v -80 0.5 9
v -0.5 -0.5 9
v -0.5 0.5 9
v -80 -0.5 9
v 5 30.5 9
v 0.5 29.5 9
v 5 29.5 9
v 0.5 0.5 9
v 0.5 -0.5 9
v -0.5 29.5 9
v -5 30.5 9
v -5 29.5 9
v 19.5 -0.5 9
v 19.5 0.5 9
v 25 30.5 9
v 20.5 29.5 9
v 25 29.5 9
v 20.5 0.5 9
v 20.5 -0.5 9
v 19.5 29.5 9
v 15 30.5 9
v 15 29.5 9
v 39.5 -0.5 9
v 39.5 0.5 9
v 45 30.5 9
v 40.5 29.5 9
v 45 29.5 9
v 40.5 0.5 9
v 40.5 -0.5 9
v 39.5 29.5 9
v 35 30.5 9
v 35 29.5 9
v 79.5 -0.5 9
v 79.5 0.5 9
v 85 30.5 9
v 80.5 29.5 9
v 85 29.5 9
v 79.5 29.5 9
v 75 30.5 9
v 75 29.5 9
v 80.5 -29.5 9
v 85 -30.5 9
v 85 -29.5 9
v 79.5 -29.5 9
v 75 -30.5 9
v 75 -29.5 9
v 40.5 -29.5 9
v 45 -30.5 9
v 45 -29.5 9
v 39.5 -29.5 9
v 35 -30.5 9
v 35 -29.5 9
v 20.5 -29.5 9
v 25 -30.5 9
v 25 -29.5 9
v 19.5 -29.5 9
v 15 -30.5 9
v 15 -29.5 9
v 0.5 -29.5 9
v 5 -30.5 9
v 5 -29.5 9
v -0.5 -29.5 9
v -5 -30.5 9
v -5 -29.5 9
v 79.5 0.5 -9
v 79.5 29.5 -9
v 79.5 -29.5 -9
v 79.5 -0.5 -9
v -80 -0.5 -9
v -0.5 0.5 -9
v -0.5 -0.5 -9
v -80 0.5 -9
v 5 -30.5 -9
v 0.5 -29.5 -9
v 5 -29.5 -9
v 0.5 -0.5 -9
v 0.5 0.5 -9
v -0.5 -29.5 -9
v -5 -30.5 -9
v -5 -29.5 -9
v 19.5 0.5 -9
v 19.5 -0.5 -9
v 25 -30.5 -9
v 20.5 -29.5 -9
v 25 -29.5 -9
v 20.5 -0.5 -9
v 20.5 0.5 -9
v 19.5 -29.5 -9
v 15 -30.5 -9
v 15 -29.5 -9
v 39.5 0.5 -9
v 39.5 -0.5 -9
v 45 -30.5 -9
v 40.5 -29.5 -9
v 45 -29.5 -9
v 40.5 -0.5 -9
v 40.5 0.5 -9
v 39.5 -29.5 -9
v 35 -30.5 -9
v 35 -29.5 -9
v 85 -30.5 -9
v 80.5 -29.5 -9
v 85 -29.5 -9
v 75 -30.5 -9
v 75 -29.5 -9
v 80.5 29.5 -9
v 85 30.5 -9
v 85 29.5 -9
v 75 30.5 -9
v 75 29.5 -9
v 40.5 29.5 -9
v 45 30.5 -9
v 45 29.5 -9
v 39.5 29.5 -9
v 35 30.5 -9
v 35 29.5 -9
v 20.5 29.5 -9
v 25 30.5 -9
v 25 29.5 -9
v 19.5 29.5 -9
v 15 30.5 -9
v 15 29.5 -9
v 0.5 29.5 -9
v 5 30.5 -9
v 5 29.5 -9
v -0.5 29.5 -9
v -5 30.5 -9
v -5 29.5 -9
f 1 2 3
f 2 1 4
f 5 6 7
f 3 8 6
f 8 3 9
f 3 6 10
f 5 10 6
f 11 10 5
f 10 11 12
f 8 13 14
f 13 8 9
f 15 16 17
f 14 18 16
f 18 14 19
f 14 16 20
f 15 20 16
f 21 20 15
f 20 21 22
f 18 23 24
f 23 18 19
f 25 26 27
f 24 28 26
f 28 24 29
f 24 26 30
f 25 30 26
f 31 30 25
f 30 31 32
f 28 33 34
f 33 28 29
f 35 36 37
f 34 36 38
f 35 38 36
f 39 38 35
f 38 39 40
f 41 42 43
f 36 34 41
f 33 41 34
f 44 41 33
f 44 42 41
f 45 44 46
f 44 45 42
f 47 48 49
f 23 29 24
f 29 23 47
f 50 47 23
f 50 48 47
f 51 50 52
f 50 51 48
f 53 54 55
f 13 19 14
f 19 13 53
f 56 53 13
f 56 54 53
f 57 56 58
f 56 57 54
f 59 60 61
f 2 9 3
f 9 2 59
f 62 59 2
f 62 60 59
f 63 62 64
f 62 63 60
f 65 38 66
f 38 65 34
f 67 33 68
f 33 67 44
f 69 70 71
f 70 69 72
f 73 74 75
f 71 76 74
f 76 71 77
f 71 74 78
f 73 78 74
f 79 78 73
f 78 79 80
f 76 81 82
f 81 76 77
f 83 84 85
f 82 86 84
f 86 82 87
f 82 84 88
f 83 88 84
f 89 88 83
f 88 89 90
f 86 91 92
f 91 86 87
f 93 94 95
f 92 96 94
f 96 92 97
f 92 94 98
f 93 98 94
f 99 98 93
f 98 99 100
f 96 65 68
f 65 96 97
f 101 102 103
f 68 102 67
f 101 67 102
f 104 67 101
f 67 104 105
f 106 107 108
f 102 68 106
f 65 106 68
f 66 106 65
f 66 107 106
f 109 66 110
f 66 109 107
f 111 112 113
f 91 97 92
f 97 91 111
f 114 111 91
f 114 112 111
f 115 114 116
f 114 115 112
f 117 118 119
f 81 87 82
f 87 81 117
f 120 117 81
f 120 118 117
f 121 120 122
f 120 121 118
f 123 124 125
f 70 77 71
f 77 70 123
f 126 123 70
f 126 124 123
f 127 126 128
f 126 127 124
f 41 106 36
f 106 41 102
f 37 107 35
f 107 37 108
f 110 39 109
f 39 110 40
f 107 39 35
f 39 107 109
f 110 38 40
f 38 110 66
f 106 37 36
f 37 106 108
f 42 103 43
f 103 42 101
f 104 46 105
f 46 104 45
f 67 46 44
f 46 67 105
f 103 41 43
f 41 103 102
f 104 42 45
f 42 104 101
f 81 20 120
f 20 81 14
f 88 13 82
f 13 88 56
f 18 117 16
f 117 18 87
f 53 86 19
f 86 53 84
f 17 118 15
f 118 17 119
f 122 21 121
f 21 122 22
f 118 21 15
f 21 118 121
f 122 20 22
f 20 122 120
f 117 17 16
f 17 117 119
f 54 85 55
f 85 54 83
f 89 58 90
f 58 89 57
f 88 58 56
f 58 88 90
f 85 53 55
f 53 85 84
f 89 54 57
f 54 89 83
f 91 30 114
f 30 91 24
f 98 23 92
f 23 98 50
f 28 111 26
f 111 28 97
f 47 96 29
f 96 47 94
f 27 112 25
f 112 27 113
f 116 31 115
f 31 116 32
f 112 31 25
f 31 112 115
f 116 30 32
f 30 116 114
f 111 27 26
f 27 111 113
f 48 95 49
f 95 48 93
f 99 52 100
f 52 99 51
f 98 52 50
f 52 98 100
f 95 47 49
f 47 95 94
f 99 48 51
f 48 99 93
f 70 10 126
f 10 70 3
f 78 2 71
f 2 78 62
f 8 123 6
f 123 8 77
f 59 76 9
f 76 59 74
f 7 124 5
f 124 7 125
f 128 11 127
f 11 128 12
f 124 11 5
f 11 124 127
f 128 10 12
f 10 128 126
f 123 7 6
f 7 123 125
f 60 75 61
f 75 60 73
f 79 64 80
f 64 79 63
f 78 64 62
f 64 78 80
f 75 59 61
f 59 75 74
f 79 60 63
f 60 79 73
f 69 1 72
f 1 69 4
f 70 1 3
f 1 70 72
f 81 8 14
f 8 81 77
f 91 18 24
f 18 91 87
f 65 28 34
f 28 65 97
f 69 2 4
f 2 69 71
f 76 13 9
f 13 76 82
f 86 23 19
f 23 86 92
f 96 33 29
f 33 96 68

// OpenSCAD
module spine(l){ //a backbone
cube([l,1, 18], center=true);

}
module leg(place, l){ //cross beams
translate([place,0,0]) rotate([0,0,90]) cube([l,1, 18],center=true);
translate([place,.5*l ,0]) rotate([0,0,0]) cube([10,1, 18],center=true);
translate([place,-.5*l ,0]) rotate([0,0,0]) cube([10,1, 18],center=true);
}
module tray(w,l,s, p){
//w for length of leg
//p for position of leg
//s for number of spines
//l for length of spine

for([0:s]){
translate(10,0,0) spine(l);}
//parametric auto build function
}
spine(160);
leg(80,60);
leg(20, 60);
leg(40, 60);
leg(0,60);
